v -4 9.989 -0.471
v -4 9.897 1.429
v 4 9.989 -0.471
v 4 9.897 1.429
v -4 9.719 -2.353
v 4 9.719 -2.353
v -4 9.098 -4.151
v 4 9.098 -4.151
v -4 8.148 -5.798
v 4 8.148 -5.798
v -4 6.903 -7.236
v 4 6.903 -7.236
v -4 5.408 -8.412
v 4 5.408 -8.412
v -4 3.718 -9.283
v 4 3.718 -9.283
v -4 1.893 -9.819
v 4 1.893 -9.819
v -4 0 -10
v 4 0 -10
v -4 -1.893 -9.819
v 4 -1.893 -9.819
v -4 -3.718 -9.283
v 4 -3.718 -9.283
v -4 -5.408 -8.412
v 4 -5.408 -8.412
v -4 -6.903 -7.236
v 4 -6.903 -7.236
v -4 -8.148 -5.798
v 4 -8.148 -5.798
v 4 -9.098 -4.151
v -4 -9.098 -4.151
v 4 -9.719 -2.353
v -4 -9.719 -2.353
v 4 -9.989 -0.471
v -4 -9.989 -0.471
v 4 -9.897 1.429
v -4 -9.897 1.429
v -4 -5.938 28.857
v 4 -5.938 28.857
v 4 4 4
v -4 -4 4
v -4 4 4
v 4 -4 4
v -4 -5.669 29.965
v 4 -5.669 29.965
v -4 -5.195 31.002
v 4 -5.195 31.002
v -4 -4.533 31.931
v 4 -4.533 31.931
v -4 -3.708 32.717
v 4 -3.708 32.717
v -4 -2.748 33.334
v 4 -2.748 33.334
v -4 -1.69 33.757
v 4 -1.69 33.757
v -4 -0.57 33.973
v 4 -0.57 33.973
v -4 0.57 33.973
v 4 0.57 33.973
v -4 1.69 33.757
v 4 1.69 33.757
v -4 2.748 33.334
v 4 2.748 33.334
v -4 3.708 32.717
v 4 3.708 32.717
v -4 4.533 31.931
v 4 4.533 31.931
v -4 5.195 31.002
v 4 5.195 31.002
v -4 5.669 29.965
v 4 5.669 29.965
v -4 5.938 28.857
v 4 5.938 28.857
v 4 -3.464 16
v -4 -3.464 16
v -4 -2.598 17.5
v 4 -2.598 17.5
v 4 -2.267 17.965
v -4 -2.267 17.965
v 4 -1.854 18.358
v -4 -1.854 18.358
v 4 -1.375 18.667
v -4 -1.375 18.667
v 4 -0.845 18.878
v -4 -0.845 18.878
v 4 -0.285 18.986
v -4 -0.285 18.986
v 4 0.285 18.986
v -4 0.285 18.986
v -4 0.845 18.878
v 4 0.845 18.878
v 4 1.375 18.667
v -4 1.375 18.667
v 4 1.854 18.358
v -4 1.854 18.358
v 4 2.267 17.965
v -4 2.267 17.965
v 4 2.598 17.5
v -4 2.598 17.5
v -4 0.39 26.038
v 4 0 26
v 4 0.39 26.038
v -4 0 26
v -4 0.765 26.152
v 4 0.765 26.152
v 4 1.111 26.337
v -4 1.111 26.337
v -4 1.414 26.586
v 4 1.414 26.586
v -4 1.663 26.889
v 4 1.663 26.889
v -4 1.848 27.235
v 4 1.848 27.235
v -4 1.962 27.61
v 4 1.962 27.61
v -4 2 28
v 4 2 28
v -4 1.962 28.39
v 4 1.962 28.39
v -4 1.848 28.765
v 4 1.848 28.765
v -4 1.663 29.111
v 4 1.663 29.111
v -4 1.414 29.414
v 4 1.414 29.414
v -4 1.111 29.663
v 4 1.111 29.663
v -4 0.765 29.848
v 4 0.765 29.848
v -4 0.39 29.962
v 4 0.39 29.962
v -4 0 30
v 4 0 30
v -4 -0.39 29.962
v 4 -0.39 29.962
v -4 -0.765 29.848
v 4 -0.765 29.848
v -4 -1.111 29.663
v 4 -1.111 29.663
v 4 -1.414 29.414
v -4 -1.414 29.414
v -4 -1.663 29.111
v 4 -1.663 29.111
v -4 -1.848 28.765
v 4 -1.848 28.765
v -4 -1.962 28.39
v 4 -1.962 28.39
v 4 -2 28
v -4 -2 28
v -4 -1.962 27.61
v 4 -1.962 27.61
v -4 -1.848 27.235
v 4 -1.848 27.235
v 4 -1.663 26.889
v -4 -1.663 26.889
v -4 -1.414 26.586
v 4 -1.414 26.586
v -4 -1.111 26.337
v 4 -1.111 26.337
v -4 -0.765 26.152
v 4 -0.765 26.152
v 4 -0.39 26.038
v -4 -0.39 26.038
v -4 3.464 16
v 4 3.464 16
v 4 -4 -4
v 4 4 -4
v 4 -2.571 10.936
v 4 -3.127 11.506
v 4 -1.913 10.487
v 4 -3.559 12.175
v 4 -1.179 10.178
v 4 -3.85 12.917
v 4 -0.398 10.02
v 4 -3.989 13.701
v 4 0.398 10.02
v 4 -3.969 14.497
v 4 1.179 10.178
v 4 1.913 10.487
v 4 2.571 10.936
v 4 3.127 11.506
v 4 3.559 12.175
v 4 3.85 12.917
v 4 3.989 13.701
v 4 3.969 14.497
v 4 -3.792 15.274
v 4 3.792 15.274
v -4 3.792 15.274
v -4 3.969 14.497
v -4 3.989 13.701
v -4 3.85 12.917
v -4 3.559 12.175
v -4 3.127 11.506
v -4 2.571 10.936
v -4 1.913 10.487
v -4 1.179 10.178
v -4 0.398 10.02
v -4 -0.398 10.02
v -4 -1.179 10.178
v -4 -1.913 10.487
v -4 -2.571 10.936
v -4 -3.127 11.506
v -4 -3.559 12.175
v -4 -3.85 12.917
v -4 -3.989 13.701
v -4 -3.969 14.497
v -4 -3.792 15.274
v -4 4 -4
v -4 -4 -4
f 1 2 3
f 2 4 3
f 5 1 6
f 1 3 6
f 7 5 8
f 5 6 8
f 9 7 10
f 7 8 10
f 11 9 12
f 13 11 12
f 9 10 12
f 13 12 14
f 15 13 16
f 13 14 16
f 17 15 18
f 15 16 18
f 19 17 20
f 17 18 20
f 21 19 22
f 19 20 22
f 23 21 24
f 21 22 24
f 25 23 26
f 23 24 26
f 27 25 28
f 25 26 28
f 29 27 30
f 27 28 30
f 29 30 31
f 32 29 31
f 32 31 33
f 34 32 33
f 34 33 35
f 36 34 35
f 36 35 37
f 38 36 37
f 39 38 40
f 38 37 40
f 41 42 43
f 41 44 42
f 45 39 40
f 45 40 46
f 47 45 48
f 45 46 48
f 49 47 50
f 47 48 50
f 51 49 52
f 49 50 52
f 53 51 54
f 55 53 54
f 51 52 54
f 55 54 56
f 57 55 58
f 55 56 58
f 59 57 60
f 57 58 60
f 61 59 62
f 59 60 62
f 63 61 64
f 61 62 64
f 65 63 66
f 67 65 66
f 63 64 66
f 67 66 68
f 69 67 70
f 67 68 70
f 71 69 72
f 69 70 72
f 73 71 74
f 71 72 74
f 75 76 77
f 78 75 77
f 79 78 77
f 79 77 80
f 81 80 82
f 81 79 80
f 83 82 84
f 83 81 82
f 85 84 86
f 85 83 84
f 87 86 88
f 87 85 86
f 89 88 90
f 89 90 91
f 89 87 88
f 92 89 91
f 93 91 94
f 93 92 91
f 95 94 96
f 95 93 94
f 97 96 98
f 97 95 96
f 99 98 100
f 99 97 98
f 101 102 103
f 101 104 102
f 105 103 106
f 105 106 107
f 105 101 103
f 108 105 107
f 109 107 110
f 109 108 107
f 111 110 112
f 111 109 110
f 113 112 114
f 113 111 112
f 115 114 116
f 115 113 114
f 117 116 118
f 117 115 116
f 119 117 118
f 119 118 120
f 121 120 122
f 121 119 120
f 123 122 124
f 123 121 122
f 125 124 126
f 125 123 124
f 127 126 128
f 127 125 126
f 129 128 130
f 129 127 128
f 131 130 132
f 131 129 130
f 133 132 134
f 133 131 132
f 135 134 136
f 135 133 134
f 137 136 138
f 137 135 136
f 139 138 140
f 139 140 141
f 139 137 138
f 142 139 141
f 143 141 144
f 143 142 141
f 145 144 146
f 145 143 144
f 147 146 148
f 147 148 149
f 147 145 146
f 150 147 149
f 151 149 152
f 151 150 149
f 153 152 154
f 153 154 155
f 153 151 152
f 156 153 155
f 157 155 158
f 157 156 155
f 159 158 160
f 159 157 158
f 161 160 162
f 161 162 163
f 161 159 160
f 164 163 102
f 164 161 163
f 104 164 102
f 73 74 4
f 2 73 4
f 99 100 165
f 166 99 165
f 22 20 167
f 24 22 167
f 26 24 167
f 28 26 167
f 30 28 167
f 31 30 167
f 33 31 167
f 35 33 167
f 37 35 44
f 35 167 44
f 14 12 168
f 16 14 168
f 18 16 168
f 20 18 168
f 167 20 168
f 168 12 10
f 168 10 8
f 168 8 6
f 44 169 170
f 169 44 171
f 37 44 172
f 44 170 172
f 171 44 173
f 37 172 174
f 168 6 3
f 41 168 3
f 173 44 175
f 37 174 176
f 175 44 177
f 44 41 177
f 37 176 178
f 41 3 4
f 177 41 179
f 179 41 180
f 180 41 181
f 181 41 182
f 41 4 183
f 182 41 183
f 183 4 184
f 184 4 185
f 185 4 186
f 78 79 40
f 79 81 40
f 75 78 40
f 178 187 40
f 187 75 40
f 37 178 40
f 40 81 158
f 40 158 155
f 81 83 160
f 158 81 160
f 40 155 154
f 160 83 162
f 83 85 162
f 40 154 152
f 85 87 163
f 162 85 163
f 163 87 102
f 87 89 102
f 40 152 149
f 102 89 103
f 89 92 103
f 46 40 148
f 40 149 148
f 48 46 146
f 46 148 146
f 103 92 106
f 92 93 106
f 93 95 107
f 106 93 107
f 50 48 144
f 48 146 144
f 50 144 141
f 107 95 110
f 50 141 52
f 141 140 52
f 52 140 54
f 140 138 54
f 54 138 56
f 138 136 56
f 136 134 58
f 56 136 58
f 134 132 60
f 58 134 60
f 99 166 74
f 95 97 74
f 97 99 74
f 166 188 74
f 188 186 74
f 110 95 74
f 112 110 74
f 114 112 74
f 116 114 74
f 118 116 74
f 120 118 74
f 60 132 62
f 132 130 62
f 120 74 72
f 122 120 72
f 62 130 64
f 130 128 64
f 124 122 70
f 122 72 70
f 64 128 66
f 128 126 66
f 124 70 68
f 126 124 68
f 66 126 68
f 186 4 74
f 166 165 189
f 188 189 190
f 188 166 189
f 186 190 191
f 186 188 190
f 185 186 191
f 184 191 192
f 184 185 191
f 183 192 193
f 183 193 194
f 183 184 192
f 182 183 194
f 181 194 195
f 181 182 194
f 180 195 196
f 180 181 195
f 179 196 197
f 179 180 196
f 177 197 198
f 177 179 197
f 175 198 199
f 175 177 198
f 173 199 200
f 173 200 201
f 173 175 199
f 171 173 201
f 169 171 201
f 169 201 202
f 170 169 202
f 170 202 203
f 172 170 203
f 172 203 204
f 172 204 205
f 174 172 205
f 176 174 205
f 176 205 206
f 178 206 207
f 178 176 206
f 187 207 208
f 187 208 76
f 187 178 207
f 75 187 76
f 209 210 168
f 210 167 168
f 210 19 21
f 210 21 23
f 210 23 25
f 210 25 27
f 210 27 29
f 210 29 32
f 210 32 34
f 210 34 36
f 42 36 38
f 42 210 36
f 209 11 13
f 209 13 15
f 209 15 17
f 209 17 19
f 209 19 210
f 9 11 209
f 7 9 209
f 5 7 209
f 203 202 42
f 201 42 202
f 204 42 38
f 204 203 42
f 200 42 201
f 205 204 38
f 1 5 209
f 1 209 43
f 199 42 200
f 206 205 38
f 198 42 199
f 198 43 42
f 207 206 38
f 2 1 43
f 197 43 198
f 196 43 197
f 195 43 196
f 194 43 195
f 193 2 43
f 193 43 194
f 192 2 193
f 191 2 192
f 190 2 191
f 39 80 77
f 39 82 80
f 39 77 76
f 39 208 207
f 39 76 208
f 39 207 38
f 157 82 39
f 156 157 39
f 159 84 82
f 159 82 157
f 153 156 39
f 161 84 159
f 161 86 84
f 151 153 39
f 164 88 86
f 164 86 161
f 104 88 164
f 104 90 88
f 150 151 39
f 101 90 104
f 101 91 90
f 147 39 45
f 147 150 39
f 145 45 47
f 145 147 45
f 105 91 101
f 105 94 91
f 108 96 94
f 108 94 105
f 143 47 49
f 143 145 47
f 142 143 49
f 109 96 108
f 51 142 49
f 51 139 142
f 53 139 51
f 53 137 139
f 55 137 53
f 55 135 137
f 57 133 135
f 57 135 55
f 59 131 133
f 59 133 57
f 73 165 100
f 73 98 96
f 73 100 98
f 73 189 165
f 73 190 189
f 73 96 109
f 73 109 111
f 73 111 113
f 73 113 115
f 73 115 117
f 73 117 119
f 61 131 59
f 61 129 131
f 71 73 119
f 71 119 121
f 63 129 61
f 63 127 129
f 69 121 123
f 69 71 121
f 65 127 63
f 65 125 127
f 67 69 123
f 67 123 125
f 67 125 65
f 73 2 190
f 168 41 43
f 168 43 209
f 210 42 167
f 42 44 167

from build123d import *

# Parameters (mm, degrees)
SKETCH_1_R      = 2
SKETCH_1_W      = 8
SKETCH_1_H      = 8
EXTRUDE_1_DEPTH = 4


with BuildPart() as part:
    # 草图1 → 凸台-拉伸1 (new, symmetric)
    with BuildSketch(Plane(origin=(0, 0, 0), x_dir=(0, 0, -1), z_dir=(1, 0, 0))):
        with BuildLine():
            Line((-28.857142857, 5.938459912), (-1.428571429, 9.897433186))
            ThreePointArc((-1.428571429, 9.897433186), (10, 0), (-1.428571429, -9.897433186))
            Line((-1.428571429, -9.897433186), (-28.857142857, -5.938459912))
            ThreePointArc((-28.857142857, -5.938459912), (-34, 0), (-28.857142857, 5.938459912))
        make_face()
        with Locations((-28, 0)):
            Circle(SKETCH_1_R, mode=Mode.SUBTRACT)
        Rectangle(SKETCH_1_W, SKETCH_1_H, mode=Mode.SUBTRACT)
        with BuildLine():
            Line((-17.5, 2.598076211), (-16, 3.464101615))
            ThreePointArc((-16, 3.464101615), (-10, 0), (-16, -3.464101615))
            Line((-16, -3.464101615), (-17.5, -2.598076211))
            ThreePointArc((-17.5, -2.598076211), (-19, 0), (-17.5, 2.598076211))
        make_face(mode=Mode.SUBTRACT)
    extrude(amount=EXTRUDE_1_DEPTH, both=True)


solid = part.part
